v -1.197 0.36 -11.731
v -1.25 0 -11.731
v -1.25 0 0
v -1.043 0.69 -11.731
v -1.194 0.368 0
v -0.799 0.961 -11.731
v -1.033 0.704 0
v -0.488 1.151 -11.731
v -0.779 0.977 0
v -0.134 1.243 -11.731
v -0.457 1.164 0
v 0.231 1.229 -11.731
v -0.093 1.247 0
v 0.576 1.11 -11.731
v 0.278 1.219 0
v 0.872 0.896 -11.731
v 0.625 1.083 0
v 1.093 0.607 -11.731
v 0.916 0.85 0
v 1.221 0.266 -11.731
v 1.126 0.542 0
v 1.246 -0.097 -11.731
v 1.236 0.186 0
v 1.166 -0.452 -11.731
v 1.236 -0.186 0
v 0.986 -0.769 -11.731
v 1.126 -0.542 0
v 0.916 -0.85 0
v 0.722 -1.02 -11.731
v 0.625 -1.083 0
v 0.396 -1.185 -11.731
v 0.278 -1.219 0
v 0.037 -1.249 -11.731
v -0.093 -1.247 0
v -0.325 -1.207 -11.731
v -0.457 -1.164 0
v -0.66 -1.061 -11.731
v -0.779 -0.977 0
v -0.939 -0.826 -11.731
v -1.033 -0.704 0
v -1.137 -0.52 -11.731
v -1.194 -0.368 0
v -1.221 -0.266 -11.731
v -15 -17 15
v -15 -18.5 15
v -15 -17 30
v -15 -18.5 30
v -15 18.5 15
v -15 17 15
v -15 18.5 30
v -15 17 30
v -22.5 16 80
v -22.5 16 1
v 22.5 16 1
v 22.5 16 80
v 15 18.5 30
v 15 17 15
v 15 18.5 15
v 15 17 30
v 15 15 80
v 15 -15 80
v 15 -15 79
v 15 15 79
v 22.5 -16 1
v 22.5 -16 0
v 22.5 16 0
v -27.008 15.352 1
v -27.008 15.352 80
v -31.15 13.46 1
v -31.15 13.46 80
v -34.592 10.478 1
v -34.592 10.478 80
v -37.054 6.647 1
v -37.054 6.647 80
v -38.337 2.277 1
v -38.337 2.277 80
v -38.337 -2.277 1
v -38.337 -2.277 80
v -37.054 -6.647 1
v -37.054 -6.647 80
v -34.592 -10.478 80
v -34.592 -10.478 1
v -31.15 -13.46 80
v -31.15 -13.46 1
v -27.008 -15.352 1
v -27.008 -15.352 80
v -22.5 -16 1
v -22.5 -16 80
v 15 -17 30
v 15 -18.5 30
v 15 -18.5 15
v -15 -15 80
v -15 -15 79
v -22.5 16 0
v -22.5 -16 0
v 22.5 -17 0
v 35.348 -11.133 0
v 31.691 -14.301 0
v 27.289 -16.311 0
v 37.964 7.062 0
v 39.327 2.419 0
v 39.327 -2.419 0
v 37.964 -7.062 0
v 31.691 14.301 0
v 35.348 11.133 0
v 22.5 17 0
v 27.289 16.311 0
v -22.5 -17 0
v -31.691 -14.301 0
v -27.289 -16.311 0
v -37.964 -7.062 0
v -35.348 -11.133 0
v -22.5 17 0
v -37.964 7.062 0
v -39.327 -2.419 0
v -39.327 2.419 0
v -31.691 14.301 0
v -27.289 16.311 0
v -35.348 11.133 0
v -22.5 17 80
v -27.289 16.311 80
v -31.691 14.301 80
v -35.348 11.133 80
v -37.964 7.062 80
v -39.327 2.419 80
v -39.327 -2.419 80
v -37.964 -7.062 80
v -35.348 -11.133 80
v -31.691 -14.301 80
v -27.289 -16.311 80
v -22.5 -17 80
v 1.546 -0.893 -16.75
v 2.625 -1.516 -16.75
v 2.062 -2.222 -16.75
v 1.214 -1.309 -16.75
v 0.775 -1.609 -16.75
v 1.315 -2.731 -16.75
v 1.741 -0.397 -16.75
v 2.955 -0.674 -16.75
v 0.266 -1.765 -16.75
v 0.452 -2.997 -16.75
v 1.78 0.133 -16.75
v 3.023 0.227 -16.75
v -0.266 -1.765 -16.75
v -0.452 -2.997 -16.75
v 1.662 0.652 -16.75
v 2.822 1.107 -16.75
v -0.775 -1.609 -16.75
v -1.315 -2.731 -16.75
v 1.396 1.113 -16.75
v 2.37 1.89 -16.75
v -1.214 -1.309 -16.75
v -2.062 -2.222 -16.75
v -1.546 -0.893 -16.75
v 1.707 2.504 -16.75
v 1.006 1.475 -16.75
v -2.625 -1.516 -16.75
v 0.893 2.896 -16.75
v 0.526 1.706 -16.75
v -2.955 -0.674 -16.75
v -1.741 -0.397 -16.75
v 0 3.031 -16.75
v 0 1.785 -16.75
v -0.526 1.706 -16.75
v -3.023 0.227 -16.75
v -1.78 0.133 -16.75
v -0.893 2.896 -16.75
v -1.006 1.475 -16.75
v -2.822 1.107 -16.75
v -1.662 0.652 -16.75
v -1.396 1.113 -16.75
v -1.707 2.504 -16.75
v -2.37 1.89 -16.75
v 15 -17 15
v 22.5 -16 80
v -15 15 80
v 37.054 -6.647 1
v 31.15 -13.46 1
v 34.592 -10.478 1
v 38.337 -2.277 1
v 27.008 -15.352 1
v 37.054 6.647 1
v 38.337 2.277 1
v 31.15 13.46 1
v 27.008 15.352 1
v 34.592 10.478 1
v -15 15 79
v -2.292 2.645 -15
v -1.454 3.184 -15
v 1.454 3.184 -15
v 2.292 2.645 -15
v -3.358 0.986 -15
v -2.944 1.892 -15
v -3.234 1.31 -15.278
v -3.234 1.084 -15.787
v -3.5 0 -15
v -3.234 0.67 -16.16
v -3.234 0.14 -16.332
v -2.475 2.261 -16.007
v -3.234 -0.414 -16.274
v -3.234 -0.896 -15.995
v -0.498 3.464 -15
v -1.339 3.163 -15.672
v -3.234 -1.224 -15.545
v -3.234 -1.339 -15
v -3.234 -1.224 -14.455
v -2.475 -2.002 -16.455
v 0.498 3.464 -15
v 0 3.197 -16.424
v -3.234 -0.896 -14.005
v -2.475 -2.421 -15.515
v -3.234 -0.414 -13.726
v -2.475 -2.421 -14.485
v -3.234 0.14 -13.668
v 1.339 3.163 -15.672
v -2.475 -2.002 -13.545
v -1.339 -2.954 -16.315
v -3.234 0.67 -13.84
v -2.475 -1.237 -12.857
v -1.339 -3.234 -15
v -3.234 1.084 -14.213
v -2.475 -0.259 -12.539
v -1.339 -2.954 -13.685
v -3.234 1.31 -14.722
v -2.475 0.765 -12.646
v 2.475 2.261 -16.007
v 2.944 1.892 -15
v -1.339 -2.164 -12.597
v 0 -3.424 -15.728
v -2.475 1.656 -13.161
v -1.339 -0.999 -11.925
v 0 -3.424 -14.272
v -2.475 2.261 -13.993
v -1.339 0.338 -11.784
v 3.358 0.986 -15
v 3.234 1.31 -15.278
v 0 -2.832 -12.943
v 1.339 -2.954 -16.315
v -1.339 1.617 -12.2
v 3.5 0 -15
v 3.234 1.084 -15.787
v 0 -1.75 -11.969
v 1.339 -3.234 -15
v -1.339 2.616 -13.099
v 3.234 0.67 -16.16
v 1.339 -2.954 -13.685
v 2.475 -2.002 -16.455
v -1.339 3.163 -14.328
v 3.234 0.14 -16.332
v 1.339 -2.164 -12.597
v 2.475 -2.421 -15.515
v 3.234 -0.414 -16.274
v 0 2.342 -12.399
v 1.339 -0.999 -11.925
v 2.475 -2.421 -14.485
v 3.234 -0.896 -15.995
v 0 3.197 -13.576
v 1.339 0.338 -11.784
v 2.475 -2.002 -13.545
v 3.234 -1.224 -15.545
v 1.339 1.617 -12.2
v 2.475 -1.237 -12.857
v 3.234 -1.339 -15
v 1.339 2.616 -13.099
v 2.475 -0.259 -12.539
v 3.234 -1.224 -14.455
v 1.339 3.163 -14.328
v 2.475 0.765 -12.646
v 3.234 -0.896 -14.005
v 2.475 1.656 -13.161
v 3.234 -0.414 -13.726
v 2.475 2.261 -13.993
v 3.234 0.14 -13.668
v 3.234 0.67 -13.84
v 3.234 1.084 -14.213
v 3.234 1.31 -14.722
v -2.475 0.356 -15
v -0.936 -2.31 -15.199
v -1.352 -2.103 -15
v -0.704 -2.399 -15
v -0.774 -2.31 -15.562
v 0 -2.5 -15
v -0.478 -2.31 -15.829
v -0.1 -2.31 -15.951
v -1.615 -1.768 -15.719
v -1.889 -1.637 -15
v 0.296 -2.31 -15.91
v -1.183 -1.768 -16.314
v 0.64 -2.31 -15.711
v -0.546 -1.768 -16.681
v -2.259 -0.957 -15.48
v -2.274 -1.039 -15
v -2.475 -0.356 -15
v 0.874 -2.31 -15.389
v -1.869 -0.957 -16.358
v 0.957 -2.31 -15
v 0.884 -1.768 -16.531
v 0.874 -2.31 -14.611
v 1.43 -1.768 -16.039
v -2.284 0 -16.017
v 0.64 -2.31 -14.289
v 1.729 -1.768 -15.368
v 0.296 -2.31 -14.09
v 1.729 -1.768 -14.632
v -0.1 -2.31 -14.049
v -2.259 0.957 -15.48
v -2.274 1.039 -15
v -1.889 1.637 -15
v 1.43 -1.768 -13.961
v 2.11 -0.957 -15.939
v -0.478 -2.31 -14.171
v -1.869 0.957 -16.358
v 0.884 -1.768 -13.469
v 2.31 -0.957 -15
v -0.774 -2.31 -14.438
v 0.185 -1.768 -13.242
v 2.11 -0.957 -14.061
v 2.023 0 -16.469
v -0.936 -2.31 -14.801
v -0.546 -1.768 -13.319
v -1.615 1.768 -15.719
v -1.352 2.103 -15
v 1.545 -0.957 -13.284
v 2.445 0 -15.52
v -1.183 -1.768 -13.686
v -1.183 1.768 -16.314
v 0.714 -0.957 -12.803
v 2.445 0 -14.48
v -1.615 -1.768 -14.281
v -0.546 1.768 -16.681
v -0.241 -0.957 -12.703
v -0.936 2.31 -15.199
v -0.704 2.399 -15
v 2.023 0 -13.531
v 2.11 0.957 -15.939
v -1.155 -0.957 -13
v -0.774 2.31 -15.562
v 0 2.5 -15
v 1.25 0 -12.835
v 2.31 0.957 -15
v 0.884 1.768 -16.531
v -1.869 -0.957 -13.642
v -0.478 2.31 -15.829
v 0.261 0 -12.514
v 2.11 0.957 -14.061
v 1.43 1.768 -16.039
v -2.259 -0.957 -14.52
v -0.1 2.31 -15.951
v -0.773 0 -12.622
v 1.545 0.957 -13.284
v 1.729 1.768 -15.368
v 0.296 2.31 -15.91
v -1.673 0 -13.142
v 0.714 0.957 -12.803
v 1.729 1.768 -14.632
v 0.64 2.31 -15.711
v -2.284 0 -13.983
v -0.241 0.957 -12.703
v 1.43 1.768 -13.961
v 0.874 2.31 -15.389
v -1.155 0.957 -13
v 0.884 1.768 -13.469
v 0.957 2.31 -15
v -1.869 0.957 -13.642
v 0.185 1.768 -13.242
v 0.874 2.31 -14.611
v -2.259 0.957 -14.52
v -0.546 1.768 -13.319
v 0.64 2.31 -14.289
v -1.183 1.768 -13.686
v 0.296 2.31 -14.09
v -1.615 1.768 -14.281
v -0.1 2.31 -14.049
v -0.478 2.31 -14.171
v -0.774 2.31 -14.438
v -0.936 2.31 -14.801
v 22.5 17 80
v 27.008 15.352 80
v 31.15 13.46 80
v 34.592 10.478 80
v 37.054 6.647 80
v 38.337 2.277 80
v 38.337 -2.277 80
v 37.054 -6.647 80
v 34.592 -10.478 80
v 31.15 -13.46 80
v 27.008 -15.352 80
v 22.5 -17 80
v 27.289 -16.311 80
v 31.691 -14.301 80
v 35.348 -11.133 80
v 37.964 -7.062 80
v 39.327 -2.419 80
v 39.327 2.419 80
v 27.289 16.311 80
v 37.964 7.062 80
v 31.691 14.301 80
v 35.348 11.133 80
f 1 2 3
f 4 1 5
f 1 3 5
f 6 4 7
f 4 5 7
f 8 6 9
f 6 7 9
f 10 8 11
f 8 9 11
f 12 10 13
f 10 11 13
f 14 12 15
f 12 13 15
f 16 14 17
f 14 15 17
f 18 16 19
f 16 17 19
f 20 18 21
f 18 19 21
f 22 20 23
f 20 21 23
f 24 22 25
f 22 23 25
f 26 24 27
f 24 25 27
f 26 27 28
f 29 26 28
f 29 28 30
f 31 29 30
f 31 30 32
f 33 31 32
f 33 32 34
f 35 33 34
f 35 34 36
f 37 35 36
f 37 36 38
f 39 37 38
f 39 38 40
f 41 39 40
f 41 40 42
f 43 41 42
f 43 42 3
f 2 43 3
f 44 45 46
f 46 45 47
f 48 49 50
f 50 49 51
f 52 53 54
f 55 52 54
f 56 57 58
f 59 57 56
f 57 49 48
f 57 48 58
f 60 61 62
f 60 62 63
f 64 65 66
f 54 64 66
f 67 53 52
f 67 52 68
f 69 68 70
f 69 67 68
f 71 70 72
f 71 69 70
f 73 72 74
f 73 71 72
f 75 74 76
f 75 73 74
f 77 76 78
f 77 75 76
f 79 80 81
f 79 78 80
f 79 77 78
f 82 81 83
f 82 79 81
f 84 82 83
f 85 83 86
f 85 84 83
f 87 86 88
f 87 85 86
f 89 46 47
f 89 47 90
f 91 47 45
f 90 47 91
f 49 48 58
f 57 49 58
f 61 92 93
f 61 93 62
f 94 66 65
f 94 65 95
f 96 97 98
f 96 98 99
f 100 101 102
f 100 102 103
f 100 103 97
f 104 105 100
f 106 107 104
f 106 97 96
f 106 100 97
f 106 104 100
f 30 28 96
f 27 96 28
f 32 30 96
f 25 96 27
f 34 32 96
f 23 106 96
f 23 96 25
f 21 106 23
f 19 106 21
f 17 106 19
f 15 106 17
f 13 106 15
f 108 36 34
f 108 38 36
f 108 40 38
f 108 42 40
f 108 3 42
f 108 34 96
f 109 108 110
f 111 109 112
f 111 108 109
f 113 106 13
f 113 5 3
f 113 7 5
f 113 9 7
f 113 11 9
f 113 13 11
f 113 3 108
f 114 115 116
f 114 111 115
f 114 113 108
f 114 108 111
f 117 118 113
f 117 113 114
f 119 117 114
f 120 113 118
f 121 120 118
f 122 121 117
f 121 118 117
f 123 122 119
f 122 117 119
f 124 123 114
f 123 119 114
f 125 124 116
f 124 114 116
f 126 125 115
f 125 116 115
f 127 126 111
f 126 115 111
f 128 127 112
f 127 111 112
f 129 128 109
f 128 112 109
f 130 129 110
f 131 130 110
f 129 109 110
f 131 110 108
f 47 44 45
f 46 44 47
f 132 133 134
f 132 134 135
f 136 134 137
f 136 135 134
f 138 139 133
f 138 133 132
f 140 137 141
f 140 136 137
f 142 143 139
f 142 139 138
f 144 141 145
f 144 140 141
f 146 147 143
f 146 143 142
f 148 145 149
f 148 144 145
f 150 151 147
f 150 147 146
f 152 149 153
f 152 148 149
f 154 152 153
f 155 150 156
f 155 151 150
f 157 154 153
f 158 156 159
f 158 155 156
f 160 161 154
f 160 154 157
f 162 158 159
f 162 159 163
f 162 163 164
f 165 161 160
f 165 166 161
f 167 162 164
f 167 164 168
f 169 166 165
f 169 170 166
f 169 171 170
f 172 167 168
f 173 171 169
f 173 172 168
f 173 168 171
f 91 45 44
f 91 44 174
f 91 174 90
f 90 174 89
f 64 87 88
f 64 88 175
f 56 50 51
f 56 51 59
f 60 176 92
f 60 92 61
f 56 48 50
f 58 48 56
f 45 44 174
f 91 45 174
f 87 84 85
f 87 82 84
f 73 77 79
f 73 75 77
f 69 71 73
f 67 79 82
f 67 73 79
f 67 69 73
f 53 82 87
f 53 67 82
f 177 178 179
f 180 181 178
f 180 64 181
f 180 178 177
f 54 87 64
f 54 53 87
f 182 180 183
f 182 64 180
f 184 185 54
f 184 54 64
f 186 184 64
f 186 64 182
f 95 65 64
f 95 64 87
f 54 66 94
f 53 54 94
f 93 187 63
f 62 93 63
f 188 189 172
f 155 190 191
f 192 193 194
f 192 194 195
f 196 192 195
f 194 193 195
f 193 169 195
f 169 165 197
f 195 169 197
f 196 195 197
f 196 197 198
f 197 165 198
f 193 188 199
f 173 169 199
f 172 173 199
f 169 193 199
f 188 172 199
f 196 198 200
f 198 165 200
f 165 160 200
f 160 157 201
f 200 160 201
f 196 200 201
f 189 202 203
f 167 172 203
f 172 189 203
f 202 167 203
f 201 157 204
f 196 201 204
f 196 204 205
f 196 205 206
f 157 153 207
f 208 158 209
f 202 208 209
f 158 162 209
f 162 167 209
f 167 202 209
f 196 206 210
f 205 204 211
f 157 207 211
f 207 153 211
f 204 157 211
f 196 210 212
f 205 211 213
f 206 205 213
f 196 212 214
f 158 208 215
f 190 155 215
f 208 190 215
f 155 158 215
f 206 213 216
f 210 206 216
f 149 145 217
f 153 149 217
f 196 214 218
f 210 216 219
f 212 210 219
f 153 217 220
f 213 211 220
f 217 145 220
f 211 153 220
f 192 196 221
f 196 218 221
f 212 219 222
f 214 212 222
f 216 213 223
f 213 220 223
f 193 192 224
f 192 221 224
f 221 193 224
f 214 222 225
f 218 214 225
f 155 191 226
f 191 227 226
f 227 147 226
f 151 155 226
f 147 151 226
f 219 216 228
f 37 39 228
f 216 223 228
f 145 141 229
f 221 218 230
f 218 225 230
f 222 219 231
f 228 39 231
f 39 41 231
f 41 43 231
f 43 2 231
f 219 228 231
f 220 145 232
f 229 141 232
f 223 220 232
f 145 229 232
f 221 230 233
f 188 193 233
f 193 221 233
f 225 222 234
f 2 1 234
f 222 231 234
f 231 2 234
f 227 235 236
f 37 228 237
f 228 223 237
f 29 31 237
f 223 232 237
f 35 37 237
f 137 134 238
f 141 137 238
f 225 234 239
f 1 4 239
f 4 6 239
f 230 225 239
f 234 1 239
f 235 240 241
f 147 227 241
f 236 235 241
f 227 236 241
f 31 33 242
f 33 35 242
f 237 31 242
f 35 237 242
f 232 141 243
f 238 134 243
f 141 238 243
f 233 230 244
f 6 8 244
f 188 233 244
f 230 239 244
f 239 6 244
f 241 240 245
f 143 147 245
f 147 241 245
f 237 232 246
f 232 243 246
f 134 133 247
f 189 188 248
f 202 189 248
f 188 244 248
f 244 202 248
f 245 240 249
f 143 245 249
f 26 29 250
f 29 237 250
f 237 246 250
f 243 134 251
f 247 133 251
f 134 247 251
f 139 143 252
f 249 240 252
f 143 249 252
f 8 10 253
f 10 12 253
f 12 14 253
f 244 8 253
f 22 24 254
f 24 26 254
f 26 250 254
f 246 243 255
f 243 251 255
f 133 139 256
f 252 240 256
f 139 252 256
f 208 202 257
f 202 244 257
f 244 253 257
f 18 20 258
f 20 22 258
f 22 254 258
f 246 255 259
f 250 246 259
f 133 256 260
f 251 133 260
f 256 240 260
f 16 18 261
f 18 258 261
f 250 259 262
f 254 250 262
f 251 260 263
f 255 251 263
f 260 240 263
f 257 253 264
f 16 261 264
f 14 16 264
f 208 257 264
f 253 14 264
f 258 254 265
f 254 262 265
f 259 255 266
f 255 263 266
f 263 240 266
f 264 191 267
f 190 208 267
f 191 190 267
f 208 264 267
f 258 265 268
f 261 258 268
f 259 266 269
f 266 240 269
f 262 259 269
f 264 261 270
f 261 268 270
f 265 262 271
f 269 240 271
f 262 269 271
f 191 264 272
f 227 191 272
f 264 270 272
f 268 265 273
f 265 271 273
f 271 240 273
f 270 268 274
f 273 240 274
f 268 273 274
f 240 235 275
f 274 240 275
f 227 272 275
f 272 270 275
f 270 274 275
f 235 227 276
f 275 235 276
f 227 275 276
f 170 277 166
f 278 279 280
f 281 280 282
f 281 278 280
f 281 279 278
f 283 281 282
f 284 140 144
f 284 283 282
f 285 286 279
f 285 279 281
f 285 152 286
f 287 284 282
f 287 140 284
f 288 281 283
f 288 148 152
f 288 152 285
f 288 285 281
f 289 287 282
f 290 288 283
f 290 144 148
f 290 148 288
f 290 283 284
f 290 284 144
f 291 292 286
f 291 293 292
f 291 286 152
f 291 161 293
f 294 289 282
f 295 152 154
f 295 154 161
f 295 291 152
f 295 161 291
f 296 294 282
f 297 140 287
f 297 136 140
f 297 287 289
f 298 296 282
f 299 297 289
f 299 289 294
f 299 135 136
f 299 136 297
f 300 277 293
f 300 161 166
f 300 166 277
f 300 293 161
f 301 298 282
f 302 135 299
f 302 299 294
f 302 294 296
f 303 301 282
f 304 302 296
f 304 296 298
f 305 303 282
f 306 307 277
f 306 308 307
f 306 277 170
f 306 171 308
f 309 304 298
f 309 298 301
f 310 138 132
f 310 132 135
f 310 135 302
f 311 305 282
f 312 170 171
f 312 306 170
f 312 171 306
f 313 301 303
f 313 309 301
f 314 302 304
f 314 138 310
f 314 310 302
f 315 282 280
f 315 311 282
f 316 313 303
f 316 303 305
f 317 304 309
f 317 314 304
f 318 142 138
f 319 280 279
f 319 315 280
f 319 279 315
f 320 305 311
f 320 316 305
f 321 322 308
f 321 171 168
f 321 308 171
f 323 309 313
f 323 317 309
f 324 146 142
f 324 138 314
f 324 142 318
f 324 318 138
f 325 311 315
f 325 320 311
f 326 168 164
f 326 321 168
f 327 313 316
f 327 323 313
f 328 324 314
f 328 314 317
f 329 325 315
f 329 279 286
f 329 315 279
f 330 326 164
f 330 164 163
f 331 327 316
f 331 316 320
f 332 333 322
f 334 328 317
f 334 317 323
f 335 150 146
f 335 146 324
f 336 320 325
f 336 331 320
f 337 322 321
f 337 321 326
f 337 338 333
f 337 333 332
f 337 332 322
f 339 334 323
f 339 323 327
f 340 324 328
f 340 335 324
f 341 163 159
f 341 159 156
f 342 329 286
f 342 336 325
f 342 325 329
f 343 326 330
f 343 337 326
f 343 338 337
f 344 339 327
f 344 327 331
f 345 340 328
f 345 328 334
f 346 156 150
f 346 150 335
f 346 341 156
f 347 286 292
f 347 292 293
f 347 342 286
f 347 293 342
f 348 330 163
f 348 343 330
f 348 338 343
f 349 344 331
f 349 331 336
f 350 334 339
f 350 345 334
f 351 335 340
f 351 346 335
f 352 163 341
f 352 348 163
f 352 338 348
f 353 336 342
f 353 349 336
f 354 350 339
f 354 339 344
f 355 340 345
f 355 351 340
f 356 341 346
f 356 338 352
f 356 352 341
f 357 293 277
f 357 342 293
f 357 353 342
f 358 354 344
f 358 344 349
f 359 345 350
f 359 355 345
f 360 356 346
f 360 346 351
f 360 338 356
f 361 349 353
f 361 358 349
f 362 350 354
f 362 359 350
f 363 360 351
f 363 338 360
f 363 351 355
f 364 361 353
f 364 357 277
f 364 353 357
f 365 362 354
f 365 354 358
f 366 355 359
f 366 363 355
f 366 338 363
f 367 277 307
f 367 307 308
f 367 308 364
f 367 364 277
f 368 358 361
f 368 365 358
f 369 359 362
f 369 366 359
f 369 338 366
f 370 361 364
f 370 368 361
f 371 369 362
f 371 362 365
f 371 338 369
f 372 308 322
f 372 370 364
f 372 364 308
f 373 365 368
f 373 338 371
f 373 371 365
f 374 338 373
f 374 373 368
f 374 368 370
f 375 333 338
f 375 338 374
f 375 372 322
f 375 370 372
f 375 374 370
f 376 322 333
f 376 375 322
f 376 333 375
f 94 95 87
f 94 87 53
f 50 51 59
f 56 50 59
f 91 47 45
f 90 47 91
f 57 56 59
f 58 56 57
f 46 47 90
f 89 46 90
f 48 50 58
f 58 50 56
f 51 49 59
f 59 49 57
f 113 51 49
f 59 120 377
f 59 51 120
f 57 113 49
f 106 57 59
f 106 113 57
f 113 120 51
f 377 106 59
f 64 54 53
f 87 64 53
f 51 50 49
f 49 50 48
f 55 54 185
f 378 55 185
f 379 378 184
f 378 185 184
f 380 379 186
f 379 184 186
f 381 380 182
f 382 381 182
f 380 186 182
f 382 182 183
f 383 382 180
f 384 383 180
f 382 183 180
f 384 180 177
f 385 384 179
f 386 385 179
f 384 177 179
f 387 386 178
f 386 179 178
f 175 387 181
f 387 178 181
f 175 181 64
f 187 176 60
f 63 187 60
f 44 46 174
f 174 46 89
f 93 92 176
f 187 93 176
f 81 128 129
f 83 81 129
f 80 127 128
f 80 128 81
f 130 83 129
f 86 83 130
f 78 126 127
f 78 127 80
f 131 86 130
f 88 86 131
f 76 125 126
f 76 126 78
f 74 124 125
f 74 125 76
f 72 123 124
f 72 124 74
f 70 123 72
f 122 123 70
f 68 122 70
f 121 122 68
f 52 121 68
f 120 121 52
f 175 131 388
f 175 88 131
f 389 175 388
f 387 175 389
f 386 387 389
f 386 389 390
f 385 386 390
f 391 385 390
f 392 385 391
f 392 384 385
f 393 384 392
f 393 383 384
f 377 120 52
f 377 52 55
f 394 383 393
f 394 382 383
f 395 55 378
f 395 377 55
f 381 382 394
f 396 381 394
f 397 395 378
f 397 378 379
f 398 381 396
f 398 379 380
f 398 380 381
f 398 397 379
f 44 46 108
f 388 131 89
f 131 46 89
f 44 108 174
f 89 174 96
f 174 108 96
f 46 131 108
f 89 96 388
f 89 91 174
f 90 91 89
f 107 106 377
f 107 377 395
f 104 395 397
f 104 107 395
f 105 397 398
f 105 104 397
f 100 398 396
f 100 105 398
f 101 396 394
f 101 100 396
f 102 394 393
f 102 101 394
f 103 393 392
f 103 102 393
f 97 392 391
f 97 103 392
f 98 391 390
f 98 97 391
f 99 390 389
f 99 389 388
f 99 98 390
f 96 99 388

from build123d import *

# Parameters (mm, degrees)
SKETCH1_W           = 45
SKETCH1_H           = 34
BOSS_EXTRUDE1_DEPTH = 80
SHELL1_T            = -1
SKETCH2_W           = 30
SKETCH2_H           = 15
BOSS_EXTRUDE2_DEPTH = 1.5
SKETCH3_W           = 30
SKETCH3_H           = 15
BOSS_EXTRUDE3_DEPTH = 1.5
SKETCH4_W           = 30
SKETCH4_H           = 15
BOSS_EXTRUDE4_DEPTH = 1.5
SKETCH5_W           = 45
SKETCH5_H           = 32
BOSS_EXTRUDE5_DEPTH = 1
SKETCH6_R           = 1.25
BOSS_EXTRUDE6_DEPTH = 15
SKETCH9_R           = 3.5
CUT_EXTRUDE1_DEPTH  = 2.75
SKETCH10_W          = 45
SKETCH10_H          = 32
BOSS_EXTRUDE7_DEPTH = 1
SKETCH11_W          = 30
SKETCH11_H          = 30
BOSS_EXTRUDE8_DEPTH = 1


with BuildPart() as part:
    # Sketch1 → Boss-Extrude1 (new body)
    with BuildSketch(Plane.XY):
        with BuildLine():
            Line((-22.5, -17), (-22.5, 17))
            ThreePointArc((-22.5, 17), (-39.5, 0), (-22.5, -17))
        make_face()
        Rectangle(SKETCH1_W, SKETCH1_H)
        with BuildLine():
            ThreePointArc((22.5, 17), (39.5, 0), (22.5, -17))
            Line((22.5, -17), (22.5, 17))
        make_face()
    extrude(amount=BOSS_EXTRUDE1_DEPTH)

    # Shell1
    shell1_openings = [part.faces().sort_by_distance(p)[0] for p in [
        (0, 0, 80),
    ]]
    offset(amount=SHELL1_T, openings=shell1_openings, kind=Kind.INTERSECTION)

    # Sketch2 → Boss-Extrude2 (add)
    with BuildSketch(Plane.XZ.offset(17)):
        with Locations((0, 22.5)):
            Rectangle(SKETCH2_W, SKETCH2_H)
    boss_extrude2 = extrude(amount=BOSS_EXTRUDE2_DEPTH)

    # Mirror1: Boss-Extrude2 across plane
    add(boss_extrude2.mirror(Plane.ZX))



with BuildPart() as body_2:
    # Sketch3 → Boss-Extrude3 (new body)
    with BuildSketch(Plane(origin=(0, 18.5, 0), x_dir=(1, 0, 0), z_dir=(0, 1, 0))):
        with Locations((0, -22.5)):
            Rectangle(SKETCH3_W, SKETCH3_H)
    extrude(amount=-BOSS_EXTRUDE3_DEPTH)


with BuildPart() as body_3:
    # Sketch4 → Boss-Extrude4 (new body)
    with BuildSketch(Plane.XZ.offset(18.5)):
        with Locations((0, 22.5)):
            Rectangle(SKETCH4_W, SKETCH4_H)
    extrude(amount=-BOSS_EXTRUDE4_DEPTH)


with BuildPart() as body_4:
    # Sketch5 → Boss-Extrude5 (new body)
    with BuildSketch(Plane(origin=(0, 0, 0), x_dir=(-1, 0, 0), z_dir=(0, 0, -1))):
        Rectangle(SKETCH5_W, SKETCH5_H)
    extrude(amount=-BOSS_EXTRUDE5_DEPTH)


with BuildPart() as part_1:
    add(part.part)

    add(body_4.part)  # Boss-Extrude6 merges body 4
    # Sketch6 → Boss-Extrude6 (add)
    with BuildSketch(Plane(origin=(0, 0, 0), x_dir=(-1, 0, 0), z_dir=(0, 0, -1))):
        Circle(SKETCH6_R)
    extrude(amount=BOSS_EXTRUDE6_DEPTH)

    # Sketch7 → Revolve1 (revolve)
    with BuildSketch(Plane(origin=(0, 0, -15), x_dir=(-1, 0, 0), z_dir=(0, 0, -1))):
        with BuildLine():
            Line((-3.5, 0), (3.5, 0))
            ThreePointArc((3.5, 0), (0, 3.5), (-3.5, 0))
        make_face()
    revolve(axis=Axis((3.5, 0, -15), (-1, 0, 0)))

    # Sketch8 → Cut-Revolve1 (revolve, cut)
    with BuildSketch(Plane(origin=(0, 0, -15), x_dir=(-1, 0, 0), z_dir=(0, 0, -1))):
        with BuildLine():
            Line((0, 2.499980539), (0, -2.499980539))
            ThreePointArc((0, -2.499980539), (2.499980539, 0), (0, 2.499980539))
        make_face()
    revolve(axis=Axis((0, 2.499980539, -15), (0, -1, 0)), mode=Mode.SUBTRACT)

    # Sketch9 → Cut-Extrude1 (cut, through all)
    with BuildSketch(Plane(origin=(0, 0, -16.75), x_dir=(-1, 0, 0), z_dir=(0, 0, -1))):
        Circle(SKETCH9_R)
    extrude(amount=CUT_EXTRUDE1_DEPTH, mode=Mode.SUBTRACT)


with BuildPart() as body_4_2:
    # Sketch10 → Boss-Extrude7 (new body)
    with BuildSketch(Plane(origin=(0, 0, 0), x_dir=(-1, 0, 0), z_dir=(0, 0, -1))):
        Rectangle(SKETCH10_W, SKETCH10_H)
    extrude(amount=-BOSS_EXTRUDE7_DEPTH)


with BuildPart() as body_5:
    # Sketch11 → Boss-Extrude8 (new body)
    with BuildSketch(Plane.XY.offset(80)):
        Rectangle(SKETCH11_W, SKETCH11_H)
    extrude(amount=-BOSS_EXTRUDE8_DEPTH)


solid = Compound([body_2.part, body_3.part, part_1.part, body_4_2.part, body_5.part])
